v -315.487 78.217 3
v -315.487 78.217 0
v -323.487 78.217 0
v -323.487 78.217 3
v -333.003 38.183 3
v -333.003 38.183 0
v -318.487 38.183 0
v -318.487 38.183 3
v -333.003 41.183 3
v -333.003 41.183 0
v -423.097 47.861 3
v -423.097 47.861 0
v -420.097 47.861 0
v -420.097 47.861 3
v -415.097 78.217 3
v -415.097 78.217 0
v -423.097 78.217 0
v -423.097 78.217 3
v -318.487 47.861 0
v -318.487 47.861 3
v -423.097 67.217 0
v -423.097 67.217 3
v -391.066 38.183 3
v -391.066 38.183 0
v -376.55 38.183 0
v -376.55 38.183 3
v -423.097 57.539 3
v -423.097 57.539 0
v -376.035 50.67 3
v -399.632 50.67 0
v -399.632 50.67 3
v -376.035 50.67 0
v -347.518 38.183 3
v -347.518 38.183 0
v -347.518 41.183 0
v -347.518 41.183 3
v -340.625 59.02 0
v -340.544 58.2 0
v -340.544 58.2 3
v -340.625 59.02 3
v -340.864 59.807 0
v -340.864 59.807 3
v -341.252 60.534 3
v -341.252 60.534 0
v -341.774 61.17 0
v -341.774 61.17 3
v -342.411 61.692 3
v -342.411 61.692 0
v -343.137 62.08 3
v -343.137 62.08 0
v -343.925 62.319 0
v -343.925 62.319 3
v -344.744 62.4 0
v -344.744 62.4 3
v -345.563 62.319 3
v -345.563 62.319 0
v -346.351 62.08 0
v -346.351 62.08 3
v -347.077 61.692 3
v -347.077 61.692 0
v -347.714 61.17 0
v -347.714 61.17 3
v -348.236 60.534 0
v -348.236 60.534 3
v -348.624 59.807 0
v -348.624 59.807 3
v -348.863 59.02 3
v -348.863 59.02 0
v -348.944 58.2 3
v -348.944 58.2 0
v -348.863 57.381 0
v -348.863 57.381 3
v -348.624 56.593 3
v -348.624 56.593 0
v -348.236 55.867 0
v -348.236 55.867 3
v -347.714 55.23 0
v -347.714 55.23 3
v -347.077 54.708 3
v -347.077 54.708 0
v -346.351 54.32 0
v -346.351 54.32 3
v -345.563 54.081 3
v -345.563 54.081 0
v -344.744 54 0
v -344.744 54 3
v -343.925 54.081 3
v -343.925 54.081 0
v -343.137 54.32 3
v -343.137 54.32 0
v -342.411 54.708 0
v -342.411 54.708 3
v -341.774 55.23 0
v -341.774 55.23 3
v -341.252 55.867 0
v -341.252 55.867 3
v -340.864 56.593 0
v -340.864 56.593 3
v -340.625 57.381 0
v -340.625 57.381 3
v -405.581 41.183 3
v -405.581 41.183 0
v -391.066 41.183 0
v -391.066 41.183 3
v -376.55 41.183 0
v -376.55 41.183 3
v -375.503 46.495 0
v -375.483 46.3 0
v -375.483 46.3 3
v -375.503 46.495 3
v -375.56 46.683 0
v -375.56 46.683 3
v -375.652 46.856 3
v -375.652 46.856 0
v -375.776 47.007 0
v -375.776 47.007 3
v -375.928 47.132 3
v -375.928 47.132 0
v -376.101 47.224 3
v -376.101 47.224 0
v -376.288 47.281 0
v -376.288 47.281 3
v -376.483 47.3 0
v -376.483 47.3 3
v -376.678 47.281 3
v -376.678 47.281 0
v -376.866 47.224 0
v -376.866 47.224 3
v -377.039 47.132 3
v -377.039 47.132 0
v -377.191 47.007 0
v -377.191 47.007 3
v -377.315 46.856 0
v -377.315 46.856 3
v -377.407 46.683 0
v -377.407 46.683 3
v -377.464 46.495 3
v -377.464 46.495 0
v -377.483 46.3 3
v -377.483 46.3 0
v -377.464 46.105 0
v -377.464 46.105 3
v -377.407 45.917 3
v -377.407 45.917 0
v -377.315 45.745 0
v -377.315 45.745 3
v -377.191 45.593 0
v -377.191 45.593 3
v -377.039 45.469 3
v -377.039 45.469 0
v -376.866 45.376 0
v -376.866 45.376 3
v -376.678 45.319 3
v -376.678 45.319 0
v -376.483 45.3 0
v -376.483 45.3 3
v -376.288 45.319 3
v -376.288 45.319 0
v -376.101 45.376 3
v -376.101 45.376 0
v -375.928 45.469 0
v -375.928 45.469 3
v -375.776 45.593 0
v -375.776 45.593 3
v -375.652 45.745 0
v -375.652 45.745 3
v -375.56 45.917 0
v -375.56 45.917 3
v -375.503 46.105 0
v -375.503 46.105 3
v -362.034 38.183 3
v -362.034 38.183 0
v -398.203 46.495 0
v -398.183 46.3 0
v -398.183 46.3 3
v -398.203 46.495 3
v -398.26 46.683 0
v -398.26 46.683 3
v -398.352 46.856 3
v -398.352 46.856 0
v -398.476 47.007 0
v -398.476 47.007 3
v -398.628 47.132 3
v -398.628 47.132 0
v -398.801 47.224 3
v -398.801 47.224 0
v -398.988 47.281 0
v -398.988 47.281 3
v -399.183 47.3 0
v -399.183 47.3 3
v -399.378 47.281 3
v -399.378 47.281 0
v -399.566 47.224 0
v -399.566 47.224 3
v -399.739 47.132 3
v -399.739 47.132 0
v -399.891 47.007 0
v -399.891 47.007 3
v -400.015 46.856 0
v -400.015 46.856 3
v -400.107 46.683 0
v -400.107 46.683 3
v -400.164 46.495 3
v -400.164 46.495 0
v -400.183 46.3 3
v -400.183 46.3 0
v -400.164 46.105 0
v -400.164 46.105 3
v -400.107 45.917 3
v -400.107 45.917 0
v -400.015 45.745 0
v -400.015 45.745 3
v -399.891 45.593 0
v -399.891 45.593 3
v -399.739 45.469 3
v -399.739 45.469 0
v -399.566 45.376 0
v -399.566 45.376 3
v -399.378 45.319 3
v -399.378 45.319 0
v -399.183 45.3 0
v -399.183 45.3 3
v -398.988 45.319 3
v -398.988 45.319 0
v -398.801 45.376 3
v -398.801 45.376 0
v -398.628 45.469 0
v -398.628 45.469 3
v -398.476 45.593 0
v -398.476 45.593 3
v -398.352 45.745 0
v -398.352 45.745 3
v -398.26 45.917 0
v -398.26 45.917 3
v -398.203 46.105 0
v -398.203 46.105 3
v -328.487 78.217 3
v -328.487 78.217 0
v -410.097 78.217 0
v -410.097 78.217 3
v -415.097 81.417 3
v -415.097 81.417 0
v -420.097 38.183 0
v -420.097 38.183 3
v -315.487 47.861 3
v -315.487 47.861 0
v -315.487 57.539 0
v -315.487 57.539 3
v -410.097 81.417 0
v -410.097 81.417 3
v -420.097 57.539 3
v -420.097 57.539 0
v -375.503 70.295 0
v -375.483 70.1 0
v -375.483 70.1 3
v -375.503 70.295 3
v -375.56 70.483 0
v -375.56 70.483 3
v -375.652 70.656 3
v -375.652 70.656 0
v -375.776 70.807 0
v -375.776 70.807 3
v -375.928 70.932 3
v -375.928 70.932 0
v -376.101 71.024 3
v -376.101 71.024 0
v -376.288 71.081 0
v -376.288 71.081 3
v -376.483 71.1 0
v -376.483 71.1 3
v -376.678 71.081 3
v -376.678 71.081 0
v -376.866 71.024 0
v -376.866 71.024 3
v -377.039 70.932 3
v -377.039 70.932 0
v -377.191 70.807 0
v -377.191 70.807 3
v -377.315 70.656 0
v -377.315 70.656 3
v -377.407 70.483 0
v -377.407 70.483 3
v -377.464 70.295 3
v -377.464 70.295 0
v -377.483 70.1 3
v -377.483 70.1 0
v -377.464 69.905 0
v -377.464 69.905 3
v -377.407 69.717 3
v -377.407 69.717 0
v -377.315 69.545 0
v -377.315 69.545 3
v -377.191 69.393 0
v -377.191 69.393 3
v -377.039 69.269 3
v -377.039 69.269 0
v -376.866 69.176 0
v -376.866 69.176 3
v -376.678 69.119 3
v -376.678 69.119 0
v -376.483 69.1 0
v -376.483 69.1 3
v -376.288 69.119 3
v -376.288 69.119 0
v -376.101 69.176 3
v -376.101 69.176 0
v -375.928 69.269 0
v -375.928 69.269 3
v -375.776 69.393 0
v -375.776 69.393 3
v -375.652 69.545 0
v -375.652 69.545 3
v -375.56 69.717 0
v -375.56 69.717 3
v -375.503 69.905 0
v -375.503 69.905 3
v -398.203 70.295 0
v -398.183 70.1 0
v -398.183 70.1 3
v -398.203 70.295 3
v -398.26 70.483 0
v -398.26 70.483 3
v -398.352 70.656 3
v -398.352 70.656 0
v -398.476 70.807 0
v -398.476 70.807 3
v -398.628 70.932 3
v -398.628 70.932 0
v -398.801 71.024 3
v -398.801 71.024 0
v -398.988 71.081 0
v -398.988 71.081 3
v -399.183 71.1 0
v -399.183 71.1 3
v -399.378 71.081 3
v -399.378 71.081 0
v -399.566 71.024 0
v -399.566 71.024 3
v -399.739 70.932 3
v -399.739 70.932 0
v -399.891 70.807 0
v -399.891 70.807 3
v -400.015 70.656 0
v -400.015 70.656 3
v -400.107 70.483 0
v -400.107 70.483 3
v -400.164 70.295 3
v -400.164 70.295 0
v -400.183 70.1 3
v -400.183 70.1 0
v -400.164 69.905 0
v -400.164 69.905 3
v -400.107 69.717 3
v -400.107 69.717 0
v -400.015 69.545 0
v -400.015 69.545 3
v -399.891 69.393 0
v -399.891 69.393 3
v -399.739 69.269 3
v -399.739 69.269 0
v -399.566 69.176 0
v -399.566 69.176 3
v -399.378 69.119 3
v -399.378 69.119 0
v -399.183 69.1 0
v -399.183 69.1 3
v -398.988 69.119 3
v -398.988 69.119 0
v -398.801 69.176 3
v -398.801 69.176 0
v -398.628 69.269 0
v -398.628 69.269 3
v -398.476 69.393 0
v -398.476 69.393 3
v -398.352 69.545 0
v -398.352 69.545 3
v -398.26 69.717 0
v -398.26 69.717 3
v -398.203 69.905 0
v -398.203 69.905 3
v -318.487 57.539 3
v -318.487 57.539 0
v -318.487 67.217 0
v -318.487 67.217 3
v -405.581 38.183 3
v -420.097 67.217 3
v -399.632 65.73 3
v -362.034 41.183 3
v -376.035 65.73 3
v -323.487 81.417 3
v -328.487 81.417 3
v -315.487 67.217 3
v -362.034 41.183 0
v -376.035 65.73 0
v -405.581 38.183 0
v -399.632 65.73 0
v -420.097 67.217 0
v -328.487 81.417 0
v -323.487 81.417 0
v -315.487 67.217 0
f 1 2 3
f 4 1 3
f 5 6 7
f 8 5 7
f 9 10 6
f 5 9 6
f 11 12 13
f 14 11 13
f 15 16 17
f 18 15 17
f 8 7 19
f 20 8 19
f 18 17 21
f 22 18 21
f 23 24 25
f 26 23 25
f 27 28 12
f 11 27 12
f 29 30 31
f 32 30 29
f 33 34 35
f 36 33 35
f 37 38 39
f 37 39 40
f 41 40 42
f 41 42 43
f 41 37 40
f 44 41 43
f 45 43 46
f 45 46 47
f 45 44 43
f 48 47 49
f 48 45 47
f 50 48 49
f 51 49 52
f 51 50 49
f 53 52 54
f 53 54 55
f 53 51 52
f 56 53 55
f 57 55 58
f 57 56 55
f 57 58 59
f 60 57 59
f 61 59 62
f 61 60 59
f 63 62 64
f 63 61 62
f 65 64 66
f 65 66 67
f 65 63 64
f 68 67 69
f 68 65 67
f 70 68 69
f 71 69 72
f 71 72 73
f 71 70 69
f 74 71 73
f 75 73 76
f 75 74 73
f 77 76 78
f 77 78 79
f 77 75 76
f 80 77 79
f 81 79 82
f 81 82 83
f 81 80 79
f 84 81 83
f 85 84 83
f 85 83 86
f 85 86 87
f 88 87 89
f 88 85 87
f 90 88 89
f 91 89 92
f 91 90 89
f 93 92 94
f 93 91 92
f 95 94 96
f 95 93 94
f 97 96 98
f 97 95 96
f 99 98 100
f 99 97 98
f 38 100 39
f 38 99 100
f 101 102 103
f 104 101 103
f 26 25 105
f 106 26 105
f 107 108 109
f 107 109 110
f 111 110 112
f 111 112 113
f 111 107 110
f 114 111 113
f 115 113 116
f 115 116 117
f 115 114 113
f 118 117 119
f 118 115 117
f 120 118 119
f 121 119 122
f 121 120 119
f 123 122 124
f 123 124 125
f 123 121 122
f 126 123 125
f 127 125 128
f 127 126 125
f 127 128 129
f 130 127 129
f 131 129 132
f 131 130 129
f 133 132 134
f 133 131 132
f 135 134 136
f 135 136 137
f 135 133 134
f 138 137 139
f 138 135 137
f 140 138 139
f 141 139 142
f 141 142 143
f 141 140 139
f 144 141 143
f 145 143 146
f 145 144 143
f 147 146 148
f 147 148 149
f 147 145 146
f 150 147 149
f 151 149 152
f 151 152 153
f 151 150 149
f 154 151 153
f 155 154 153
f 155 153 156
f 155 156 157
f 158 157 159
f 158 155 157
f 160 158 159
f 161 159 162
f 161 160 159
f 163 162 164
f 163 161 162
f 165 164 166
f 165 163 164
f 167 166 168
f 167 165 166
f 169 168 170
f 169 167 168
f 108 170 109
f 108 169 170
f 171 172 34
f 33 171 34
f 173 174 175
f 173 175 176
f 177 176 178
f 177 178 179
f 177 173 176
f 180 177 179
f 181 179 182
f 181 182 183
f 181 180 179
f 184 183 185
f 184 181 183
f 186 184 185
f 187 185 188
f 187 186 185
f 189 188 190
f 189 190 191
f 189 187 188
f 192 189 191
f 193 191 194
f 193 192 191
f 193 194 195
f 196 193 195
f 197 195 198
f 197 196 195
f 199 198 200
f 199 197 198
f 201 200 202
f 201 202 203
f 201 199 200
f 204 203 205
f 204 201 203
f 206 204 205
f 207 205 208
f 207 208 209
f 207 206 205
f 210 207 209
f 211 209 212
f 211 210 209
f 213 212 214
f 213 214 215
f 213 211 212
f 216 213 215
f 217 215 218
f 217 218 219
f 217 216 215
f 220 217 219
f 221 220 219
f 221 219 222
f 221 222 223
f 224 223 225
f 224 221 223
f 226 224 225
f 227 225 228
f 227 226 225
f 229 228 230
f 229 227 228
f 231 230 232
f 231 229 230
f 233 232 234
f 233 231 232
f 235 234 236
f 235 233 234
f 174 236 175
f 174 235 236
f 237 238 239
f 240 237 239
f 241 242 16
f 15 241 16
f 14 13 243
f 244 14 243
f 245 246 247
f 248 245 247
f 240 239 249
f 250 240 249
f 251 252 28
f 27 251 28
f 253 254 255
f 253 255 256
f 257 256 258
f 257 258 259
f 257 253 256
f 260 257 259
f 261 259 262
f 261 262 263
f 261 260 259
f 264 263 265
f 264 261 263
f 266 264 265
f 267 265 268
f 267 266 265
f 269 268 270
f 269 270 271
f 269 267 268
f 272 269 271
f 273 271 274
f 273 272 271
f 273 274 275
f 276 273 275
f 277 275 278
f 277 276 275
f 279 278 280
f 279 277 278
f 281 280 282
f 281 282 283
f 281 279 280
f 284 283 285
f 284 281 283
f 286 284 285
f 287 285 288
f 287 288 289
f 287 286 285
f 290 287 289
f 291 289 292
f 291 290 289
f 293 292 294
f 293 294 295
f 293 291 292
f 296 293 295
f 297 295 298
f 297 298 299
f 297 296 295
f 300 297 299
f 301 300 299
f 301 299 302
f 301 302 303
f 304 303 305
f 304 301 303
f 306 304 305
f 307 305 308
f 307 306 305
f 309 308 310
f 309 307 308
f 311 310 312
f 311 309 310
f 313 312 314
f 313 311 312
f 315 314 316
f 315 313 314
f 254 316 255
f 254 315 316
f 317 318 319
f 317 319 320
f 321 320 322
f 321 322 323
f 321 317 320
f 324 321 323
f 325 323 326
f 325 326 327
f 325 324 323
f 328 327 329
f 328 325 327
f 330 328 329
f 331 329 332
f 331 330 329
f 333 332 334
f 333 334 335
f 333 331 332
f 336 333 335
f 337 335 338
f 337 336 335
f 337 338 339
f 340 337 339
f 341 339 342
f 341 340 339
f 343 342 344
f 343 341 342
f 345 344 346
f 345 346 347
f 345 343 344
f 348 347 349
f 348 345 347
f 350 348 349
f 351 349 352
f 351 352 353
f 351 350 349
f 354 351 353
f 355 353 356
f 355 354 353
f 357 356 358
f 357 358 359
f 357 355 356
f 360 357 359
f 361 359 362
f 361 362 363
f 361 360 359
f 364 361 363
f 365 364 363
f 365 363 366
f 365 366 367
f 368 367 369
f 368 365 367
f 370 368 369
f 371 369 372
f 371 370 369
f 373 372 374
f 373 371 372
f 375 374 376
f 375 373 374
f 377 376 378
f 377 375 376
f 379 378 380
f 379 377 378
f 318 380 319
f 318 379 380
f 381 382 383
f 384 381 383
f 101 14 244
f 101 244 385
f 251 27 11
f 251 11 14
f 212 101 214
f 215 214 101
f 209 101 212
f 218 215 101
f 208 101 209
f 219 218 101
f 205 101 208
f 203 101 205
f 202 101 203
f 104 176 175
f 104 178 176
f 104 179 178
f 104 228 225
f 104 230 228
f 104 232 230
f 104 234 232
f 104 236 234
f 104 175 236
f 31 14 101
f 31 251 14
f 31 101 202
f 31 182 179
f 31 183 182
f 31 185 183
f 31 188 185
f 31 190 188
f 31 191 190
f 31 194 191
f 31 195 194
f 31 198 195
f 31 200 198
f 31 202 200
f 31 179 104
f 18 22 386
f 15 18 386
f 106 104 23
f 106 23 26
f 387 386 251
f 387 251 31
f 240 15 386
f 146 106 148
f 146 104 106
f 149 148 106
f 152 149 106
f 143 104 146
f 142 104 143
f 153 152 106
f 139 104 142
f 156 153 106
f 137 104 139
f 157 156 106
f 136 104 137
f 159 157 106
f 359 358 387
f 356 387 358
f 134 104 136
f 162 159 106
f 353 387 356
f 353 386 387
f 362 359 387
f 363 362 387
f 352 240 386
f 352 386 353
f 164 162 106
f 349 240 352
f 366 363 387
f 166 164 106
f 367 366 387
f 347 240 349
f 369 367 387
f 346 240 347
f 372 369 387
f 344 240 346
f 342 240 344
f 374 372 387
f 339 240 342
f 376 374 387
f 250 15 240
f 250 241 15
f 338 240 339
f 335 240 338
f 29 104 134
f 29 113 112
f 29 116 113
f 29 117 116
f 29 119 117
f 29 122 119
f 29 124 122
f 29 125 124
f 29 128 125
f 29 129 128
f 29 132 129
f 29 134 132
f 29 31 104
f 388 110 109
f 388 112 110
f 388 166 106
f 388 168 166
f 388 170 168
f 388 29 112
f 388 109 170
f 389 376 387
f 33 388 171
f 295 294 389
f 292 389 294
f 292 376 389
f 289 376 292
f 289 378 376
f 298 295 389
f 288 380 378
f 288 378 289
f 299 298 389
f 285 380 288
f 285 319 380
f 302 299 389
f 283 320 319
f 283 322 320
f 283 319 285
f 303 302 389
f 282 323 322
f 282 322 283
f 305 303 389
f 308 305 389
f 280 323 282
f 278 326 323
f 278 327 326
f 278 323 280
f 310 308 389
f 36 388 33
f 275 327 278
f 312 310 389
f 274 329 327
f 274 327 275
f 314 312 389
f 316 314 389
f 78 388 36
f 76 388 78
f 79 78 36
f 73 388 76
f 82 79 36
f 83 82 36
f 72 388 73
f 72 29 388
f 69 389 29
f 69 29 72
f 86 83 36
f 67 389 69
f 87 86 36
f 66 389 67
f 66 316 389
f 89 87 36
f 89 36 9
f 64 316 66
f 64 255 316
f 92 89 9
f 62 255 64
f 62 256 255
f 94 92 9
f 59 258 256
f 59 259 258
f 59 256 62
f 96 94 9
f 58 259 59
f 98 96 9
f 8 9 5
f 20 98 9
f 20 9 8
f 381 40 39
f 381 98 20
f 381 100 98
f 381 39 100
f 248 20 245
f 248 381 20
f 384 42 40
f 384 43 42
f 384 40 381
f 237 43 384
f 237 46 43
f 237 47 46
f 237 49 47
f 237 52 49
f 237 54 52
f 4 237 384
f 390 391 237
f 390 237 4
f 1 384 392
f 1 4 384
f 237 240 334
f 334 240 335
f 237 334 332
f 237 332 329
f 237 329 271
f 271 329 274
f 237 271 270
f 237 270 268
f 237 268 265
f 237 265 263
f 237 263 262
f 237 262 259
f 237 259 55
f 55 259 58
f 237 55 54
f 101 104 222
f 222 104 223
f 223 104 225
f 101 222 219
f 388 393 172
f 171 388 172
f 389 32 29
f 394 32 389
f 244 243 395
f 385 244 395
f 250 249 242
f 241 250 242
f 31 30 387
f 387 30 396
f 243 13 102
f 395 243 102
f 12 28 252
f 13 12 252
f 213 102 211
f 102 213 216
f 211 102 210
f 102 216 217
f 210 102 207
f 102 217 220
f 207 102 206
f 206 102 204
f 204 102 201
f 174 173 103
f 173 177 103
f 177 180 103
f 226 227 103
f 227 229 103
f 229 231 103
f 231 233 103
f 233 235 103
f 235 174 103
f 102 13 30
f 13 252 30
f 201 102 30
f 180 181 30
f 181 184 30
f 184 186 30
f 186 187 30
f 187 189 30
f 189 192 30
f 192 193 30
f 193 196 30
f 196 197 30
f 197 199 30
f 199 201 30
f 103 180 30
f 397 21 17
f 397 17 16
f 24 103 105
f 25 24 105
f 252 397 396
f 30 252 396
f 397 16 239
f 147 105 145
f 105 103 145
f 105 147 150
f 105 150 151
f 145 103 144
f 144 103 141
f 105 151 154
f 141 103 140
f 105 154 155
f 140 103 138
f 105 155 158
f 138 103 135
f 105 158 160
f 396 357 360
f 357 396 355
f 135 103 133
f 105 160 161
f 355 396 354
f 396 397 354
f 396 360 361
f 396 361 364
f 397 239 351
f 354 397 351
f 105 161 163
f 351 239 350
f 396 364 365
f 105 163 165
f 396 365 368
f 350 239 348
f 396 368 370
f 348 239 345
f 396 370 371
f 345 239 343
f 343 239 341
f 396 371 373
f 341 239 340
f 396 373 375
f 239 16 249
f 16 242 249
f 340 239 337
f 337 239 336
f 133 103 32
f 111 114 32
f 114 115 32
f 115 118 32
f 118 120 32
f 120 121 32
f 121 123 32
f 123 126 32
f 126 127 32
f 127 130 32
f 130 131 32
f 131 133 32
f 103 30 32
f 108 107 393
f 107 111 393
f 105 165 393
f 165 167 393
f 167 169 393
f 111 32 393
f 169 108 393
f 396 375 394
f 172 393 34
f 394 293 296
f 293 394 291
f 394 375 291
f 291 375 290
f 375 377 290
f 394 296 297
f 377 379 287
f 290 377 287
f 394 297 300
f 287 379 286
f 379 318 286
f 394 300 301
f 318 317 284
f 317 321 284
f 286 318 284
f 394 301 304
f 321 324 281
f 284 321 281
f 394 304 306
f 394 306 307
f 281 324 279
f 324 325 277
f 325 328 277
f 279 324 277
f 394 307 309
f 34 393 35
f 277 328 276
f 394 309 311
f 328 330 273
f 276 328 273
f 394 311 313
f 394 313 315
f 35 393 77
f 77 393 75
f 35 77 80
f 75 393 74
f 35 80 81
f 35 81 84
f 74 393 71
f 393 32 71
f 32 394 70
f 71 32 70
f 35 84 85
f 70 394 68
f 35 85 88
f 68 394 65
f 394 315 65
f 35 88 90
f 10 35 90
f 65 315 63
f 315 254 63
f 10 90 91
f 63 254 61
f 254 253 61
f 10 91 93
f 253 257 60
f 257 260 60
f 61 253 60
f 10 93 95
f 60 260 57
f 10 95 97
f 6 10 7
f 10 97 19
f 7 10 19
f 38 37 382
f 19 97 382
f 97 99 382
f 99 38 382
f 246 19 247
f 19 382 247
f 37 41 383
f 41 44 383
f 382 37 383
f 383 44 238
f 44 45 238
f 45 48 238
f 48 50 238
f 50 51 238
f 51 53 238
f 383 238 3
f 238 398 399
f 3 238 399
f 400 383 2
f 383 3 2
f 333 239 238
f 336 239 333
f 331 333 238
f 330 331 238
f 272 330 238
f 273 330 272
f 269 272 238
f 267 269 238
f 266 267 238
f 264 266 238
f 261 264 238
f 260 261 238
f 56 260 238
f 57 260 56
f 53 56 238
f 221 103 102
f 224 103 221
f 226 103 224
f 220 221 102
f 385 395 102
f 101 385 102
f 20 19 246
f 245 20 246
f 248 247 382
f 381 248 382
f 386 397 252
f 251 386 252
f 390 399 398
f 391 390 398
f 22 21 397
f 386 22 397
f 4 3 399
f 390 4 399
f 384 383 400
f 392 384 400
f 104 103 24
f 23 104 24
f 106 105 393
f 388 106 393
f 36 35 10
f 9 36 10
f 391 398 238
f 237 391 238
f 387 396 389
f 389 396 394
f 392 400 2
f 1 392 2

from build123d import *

# Parameters (mm, degrees)
CROQUIS1_R              = 1
CROQUIS1_W              = 23.597249427
CROQUIS1_H              = 15.06
CROQUIS1_R_2            = 4.2
SALIENTE_EXTRUIR1_DEPTH = 3


with BuildPart() as part:
    # Croquis1 → Saliente-Extruir1 (new body)
    with BuildSketch(Plane.XY):
        Polygon((-333.002689238, 38.183153475), (-318.486974952, 38.183153475), (-318.486974952, 47.861153475), (-315.486974952, 47.861153475), (-315.486974952, 57.539153475), (-318.486974952, 57.539153475), (-318.486974952, 67.217153475), (-315.486974952, 67.217153475), (-315.486974952, 78.217153475), (-318.486974952, 78.217153475), (-323.486974952, 78.217153475), (-323.486974952, 81.417153475), (-328.486974952, 81.417153475), (-328.486974952, 78.217153475), (-410.096974952, 78.217153475), (-410.096974952, 81.417153475), (-415.096974952, 81.417153475), (-415.096974952, 78.217153475), (-420.096974952, 78.217153475), (-423.096974952, 78.217153475), (-423.096974952, 67.217153475), (-420.096974952, 67.217153475), (-420.096974952, 57.539153475), (-423.096974952, 57.539153475), (-423.096974952, 47.861153475), (-420.096974952, 47.861153475), (-420.096974952, 38.183153475), (-405.581260666, 38.183153475), (-405.581260666, 41.183153475), (-391.06554638, 41.183153475), (-391.06554638, 38.183153475), (-376.549832095, 38.183153475), (-376.549832095, 41.183153475), (-362.034117809, 41.183153475), (-362.034117809, 38.183153475), (-347.518403523, 38.183153475), (-347.518403523, 41.183153475), (-333.002689238, 41.183153475), align=None)
        with Locations((-399.183395748, 46.300153475)):
            Circle(CROQUIS1_R, mode=Mode.SUBTRACT)
        with Locations((-387.833395749, 58.200153475)):
            Rectangle(CROQUIS1_W, CROQUIS1_H, mode=Mode.SUBTRACT)
        with Locations((-376.483395748, 46.300153475)):
            Circle(CROQUIS1_R, mode=Mode.SUBTRACT)
        with Locations((-344.743963788, 58.200153475)):
            Circle(CROQUIS1_R_2, mode=Mode.SUBTRACT)
        with Locations((-399.183395748, 70.100153475)):
            Circle(CROQUIS1_R, mode=Mode.SUBTRACT)
        with Locations((-376.483395748, 70.100153475)):
            Circle(CROQUIS1_R, mode=Mode.SUBTRACT)
    extrude(amount=SALIENTE_EXTRUIR1_DEPTH)


solid = part.part
